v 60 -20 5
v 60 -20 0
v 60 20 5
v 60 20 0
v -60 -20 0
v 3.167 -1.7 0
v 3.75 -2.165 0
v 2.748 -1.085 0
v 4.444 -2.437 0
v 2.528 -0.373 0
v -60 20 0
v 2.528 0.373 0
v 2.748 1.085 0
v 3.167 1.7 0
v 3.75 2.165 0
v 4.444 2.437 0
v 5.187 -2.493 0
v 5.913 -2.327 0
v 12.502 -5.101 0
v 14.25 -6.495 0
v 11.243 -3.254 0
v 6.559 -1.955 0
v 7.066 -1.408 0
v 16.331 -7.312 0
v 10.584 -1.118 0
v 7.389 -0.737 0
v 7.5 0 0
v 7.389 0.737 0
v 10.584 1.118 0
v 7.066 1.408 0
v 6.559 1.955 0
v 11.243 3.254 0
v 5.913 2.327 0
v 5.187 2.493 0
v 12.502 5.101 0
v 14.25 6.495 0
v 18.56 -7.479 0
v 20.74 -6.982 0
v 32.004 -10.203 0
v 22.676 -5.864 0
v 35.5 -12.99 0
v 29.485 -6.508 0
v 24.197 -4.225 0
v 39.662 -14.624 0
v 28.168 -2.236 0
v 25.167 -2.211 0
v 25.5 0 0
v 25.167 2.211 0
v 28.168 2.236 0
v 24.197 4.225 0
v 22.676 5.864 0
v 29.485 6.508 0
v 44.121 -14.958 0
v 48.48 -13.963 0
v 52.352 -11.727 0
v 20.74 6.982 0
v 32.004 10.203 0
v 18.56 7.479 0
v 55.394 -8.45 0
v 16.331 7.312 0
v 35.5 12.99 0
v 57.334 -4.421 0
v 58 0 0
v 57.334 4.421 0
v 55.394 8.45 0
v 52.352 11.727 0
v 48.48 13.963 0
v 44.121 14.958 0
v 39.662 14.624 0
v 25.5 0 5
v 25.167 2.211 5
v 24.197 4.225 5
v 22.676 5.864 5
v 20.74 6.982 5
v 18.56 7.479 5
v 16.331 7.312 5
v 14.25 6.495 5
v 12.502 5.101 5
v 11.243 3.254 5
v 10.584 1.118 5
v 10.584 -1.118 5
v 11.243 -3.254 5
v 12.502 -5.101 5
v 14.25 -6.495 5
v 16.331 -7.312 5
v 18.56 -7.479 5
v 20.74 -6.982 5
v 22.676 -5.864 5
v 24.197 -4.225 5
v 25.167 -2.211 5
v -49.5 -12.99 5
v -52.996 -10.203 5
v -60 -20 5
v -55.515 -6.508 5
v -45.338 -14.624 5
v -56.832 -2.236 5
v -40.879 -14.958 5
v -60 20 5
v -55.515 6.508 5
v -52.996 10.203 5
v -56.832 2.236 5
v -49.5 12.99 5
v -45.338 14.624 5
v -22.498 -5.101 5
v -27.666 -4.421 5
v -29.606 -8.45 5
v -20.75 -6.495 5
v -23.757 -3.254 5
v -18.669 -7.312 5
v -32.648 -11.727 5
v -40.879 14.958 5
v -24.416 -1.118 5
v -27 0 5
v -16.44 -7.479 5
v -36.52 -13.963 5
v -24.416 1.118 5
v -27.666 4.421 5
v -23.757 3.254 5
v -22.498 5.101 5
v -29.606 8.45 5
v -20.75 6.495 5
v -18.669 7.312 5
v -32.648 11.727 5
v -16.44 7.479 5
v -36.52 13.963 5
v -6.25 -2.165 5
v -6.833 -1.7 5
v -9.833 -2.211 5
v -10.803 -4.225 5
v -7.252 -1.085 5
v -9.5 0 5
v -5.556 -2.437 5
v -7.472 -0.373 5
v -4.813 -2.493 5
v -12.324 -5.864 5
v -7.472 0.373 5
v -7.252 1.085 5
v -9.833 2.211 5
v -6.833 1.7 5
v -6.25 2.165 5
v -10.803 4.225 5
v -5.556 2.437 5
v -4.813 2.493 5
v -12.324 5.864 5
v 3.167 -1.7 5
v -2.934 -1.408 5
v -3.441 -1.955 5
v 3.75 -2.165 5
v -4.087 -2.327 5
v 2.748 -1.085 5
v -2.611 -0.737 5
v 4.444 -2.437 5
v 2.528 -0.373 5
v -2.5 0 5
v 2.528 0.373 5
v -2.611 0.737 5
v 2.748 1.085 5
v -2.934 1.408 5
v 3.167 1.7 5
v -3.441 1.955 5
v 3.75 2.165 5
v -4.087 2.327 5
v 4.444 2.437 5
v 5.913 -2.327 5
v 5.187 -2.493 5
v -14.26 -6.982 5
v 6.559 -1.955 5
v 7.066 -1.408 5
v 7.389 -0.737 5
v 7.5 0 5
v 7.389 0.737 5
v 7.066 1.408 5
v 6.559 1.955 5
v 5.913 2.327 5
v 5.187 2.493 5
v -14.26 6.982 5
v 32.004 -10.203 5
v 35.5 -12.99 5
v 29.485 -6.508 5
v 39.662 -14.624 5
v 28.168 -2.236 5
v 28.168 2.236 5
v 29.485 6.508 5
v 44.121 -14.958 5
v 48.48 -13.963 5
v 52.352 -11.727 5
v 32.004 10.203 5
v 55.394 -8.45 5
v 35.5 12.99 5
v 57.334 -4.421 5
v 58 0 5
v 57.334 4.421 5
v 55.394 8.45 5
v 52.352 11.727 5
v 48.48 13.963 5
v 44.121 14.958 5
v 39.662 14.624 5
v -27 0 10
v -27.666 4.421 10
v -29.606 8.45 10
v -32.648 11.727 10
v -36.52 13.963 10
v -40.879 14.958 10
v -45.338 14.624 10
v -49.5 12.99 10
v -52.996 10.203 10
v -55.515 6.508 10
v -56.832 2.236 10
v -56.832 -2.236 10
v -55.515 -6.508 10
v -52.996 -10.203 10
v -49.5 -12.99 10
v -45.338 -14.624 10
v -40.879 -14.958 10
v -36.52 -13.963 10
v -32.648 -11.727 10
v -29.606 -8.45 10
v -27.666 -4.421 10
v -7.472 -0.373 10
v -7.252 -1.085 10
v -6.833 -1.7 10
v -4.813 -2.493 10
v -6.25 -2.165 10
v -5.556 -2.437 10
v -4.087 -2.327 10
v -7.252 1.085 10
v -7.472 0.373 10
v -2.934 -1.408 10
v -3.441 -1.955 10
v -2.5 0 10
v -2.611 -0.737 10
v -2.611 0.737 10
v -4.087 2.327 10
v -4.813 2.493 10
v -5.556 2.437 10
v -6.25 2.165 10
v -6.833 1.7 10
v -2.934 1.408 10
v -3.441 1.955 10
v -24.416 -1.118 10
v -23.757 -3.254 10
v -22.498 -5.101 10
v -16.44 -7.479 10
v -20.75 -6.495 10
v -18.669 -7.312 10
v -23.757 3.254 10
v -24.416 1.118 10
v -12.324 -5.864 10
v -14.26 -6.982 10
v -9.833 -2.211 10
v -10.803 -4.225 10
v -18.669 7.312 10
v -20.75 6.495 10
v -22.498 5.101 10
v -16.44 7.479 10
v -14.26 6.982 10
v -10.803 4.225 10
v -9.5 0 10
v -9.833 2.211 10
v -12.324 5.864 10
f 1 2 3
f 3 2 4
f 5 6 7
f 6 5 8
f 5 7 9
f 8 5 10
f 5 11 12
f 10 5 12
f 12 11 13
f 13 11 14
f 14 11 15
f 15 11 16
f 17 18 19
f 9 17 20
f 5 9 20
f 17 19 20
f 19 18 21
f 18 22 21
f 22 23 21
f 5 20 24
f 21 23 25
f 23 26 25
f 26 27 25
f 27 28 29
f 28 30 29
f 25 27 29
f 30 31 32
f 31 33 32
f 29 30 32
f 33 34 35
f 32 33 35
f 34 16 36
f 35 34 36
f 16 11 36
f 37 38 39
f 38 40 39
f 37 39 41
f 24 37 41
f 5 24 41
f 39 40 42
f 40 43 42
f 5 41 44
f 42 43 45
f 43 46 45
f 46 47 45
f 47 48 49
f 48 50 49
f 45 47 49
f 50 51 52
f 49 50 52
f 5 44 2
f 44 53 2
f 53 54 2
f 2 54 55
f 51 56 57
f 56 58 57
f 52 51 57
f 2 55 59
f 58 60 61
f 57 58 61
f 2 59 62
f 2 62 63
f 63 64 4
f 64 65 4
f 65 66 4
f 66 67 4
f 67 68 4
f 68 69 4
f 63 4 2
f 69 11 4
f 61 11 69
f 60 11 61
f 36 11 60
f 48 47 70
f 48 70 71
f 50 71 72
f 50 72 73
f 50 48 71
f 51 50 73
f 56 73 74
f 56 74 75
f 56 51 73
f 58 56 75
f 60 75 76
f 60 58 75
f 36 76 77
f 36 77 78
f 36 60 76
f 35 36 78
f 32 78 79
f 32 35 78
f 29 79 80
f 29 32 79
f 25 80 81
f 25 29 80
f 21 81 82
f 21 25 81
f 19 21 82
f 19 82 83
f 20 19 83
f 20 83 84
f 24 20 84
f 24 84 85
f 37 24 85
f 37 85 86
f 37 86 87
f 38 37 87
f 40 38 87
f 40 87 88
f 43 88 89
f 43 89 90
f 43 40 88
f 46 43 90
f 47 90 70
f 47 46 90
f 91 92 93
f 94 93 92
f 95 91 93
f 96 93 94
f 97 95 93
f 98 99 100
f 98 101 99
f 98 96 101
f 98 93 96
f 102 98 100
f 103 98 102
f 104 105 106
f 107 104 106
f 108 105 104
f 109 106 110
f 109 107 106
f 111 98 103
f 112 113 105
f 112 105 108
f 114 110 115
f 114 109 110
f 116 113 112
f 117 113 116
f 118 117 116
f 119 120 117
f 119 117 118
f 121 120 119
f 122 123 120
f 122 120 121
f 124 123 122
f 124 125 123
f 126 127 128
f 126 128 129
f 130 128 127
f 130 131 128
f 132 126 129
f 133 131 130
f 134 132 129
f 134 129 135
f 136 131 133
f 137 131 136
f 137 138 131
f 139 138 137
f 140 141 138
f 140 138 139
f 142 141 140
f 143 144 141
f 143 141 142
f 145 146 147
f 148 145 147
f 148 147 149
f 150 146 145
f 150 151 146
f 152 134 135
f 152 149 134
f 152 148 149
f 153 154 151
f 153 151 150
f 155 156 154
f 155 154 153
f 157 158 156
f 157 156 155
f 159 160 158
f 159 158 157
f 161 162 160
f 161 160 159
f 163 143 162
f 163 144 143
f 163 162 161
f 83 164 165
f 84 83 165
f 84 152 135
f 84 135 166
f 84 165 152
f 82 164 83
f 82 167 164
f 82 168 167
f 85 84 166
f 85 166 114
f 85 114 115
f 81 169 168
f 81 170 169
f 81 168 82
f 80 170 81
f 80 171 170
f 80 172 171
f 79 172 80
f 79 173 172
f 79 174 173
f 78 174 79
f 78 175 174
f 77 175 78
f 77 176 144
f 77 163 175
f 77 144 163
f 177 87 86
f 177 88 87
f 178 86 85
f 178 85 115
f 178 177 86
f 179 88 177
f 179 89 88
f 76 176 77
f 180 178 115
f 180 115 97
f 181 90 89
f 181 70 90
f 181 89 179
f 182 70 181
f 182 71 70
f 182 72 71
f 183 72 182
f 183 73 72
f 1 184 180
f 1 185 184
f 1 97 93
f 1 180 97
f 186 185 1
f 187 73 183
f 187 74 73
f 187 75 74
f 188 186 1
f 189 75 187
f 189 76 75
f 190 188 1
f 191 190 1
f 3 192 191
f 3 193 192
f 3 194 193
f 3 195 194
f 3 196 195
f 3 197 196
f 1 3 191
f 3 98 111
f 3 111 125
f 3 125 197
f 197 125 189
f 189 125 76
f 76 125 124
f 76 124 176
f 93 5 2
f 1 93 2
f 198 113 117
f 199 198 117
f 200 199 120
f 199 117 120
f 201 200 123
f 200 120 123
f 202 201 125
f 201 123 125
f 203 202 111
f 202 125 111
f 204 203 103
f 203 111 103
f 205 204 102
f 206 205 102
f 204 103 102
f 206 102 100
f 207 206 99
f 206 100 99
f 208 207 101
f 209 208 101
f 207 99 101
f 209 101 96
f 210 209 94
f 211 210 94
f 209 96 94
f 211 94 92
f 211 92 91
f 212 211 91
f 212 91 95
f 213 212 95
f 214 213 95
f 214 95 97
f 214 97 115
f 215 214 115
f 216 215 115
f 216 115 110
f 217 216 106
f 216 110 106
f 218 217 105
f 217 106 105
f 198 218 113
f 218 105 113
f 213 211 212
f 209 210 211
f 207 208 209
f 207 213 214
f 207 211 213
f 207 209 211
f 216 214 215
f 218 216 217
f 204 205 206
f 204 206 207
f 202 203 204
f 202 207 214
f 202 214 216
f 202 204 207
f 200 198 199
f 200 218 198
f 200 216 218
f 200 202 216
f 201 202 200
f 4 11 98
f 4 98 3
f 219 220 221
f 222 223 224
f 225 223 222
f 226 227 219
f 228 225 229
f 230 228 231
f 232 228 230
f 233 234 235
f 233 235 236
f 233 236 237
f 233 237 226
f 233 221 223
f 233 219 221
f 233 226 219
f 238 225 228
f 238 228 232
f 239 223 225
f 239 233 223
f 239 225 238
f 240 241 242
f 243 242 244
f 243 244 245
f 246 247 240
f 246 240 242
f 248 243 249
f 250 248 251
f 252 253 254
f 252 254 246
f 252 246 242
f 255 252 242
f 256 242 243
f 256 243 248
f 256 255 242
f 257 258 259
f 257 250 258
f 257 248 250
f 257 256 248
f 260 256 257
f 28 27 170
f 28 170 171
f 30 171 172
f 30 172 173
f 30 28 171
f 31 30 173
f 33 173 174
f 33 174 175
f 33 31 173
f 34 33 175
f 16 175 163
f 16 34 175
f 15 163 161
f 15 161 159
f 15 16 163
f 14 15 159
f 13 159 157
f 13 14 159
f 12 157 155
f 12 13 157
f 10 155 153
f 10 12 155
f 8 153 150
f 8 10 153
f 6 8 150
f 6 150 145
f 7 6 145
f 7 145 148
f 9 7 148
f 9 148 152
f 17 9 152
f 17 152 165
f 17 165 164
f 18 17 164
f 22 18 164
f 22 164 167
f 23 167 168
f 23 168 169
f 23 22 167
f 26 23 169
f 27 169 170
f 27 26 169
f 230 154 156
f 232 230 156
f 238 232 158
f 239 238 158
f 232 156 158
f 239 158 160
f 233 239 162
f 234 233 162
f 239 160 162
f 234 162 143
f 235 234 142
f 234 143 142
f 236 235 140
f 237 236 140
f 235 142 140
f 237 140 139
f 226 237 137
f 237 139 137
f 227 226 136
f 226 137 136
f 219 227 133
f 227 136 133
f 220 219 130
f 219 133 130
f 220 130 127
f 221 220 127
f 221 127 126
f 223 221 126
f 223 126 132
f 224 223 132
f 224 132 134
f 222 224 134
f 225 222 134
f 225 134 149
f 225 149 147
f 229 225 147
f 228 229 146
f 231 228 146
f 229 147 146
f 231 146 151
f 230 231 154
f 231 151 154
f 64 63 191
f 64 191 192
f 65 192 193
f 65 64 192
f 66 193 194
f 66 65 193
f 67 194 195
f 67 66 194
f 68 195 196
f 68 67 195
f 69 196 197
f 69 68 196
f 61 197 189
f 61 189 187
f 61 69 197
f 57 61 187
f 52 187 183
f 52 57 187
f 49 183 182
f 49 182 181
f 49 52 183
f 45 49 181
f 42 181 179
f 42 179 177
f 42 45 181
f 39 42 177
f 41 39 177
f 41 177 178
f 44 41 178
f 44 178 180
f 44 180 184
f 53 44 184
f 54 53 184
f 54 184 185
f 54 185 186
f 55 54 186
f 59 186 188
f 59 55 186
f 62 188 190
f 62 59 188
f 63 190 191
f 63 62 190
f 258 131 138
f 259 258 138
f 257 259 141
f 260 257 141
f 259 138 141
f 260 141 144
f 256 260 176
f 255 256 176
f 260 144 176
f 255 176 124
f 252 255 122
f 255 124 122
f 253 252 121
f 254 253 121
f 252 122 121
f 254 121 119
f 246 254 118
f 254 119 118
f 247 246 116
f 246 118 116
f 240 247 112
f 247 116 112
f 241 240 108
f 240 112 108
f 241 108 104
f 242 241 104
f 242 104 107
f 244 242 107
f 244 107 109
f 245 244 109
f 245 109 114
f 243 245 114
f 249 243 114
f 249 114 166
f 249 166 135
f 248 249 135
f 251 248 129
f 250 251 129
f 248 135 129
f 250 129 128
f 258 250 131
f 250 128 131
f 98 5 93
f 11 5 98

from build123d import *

# Parameters (mm, degrees)
F0_W     = 120
F0_H     = 40
F0_R     = 2.5
F0_R_2   = 7.5
F0_R_3   = 15
F1_DEPTH = 5
F2_R     = 2.5
F2_R_2   = 7.5
F2_R_3   = 15
F3_DEPTH = 5


with BuildPart() as f1:
    # F0 (on Top) → F1 (new body)
    with BuildSketch(Plane.XY):
        Rectangle(F0_W, F0_H)
        with Locations((5, 0)):
            Circle(F0_R, mode=Mode.SUBTRACT)
        with Locations((18, 0)):
            Circle(F0_R_2, mode=Mode.SUBTRACT)
        with Locations((43, 0)):
            Circle(F0_R_3, mode=Mode.SUBTRACT)
    extrude(amount=F1_DEPTH)

    # F2 (on face) → F3 (join)
    with BuildSketch(Plane.XY.offset(5)):
        with Locations((-5, 0)):
            Circle(F2_R)
        with Locations((-17, 0)):
            Circle(F2_R_2)
        with Locations((-42, 0)):
            Circle(F2_R_3)
    extrude(amount=F3_DEPTH)


solid = f1.part
